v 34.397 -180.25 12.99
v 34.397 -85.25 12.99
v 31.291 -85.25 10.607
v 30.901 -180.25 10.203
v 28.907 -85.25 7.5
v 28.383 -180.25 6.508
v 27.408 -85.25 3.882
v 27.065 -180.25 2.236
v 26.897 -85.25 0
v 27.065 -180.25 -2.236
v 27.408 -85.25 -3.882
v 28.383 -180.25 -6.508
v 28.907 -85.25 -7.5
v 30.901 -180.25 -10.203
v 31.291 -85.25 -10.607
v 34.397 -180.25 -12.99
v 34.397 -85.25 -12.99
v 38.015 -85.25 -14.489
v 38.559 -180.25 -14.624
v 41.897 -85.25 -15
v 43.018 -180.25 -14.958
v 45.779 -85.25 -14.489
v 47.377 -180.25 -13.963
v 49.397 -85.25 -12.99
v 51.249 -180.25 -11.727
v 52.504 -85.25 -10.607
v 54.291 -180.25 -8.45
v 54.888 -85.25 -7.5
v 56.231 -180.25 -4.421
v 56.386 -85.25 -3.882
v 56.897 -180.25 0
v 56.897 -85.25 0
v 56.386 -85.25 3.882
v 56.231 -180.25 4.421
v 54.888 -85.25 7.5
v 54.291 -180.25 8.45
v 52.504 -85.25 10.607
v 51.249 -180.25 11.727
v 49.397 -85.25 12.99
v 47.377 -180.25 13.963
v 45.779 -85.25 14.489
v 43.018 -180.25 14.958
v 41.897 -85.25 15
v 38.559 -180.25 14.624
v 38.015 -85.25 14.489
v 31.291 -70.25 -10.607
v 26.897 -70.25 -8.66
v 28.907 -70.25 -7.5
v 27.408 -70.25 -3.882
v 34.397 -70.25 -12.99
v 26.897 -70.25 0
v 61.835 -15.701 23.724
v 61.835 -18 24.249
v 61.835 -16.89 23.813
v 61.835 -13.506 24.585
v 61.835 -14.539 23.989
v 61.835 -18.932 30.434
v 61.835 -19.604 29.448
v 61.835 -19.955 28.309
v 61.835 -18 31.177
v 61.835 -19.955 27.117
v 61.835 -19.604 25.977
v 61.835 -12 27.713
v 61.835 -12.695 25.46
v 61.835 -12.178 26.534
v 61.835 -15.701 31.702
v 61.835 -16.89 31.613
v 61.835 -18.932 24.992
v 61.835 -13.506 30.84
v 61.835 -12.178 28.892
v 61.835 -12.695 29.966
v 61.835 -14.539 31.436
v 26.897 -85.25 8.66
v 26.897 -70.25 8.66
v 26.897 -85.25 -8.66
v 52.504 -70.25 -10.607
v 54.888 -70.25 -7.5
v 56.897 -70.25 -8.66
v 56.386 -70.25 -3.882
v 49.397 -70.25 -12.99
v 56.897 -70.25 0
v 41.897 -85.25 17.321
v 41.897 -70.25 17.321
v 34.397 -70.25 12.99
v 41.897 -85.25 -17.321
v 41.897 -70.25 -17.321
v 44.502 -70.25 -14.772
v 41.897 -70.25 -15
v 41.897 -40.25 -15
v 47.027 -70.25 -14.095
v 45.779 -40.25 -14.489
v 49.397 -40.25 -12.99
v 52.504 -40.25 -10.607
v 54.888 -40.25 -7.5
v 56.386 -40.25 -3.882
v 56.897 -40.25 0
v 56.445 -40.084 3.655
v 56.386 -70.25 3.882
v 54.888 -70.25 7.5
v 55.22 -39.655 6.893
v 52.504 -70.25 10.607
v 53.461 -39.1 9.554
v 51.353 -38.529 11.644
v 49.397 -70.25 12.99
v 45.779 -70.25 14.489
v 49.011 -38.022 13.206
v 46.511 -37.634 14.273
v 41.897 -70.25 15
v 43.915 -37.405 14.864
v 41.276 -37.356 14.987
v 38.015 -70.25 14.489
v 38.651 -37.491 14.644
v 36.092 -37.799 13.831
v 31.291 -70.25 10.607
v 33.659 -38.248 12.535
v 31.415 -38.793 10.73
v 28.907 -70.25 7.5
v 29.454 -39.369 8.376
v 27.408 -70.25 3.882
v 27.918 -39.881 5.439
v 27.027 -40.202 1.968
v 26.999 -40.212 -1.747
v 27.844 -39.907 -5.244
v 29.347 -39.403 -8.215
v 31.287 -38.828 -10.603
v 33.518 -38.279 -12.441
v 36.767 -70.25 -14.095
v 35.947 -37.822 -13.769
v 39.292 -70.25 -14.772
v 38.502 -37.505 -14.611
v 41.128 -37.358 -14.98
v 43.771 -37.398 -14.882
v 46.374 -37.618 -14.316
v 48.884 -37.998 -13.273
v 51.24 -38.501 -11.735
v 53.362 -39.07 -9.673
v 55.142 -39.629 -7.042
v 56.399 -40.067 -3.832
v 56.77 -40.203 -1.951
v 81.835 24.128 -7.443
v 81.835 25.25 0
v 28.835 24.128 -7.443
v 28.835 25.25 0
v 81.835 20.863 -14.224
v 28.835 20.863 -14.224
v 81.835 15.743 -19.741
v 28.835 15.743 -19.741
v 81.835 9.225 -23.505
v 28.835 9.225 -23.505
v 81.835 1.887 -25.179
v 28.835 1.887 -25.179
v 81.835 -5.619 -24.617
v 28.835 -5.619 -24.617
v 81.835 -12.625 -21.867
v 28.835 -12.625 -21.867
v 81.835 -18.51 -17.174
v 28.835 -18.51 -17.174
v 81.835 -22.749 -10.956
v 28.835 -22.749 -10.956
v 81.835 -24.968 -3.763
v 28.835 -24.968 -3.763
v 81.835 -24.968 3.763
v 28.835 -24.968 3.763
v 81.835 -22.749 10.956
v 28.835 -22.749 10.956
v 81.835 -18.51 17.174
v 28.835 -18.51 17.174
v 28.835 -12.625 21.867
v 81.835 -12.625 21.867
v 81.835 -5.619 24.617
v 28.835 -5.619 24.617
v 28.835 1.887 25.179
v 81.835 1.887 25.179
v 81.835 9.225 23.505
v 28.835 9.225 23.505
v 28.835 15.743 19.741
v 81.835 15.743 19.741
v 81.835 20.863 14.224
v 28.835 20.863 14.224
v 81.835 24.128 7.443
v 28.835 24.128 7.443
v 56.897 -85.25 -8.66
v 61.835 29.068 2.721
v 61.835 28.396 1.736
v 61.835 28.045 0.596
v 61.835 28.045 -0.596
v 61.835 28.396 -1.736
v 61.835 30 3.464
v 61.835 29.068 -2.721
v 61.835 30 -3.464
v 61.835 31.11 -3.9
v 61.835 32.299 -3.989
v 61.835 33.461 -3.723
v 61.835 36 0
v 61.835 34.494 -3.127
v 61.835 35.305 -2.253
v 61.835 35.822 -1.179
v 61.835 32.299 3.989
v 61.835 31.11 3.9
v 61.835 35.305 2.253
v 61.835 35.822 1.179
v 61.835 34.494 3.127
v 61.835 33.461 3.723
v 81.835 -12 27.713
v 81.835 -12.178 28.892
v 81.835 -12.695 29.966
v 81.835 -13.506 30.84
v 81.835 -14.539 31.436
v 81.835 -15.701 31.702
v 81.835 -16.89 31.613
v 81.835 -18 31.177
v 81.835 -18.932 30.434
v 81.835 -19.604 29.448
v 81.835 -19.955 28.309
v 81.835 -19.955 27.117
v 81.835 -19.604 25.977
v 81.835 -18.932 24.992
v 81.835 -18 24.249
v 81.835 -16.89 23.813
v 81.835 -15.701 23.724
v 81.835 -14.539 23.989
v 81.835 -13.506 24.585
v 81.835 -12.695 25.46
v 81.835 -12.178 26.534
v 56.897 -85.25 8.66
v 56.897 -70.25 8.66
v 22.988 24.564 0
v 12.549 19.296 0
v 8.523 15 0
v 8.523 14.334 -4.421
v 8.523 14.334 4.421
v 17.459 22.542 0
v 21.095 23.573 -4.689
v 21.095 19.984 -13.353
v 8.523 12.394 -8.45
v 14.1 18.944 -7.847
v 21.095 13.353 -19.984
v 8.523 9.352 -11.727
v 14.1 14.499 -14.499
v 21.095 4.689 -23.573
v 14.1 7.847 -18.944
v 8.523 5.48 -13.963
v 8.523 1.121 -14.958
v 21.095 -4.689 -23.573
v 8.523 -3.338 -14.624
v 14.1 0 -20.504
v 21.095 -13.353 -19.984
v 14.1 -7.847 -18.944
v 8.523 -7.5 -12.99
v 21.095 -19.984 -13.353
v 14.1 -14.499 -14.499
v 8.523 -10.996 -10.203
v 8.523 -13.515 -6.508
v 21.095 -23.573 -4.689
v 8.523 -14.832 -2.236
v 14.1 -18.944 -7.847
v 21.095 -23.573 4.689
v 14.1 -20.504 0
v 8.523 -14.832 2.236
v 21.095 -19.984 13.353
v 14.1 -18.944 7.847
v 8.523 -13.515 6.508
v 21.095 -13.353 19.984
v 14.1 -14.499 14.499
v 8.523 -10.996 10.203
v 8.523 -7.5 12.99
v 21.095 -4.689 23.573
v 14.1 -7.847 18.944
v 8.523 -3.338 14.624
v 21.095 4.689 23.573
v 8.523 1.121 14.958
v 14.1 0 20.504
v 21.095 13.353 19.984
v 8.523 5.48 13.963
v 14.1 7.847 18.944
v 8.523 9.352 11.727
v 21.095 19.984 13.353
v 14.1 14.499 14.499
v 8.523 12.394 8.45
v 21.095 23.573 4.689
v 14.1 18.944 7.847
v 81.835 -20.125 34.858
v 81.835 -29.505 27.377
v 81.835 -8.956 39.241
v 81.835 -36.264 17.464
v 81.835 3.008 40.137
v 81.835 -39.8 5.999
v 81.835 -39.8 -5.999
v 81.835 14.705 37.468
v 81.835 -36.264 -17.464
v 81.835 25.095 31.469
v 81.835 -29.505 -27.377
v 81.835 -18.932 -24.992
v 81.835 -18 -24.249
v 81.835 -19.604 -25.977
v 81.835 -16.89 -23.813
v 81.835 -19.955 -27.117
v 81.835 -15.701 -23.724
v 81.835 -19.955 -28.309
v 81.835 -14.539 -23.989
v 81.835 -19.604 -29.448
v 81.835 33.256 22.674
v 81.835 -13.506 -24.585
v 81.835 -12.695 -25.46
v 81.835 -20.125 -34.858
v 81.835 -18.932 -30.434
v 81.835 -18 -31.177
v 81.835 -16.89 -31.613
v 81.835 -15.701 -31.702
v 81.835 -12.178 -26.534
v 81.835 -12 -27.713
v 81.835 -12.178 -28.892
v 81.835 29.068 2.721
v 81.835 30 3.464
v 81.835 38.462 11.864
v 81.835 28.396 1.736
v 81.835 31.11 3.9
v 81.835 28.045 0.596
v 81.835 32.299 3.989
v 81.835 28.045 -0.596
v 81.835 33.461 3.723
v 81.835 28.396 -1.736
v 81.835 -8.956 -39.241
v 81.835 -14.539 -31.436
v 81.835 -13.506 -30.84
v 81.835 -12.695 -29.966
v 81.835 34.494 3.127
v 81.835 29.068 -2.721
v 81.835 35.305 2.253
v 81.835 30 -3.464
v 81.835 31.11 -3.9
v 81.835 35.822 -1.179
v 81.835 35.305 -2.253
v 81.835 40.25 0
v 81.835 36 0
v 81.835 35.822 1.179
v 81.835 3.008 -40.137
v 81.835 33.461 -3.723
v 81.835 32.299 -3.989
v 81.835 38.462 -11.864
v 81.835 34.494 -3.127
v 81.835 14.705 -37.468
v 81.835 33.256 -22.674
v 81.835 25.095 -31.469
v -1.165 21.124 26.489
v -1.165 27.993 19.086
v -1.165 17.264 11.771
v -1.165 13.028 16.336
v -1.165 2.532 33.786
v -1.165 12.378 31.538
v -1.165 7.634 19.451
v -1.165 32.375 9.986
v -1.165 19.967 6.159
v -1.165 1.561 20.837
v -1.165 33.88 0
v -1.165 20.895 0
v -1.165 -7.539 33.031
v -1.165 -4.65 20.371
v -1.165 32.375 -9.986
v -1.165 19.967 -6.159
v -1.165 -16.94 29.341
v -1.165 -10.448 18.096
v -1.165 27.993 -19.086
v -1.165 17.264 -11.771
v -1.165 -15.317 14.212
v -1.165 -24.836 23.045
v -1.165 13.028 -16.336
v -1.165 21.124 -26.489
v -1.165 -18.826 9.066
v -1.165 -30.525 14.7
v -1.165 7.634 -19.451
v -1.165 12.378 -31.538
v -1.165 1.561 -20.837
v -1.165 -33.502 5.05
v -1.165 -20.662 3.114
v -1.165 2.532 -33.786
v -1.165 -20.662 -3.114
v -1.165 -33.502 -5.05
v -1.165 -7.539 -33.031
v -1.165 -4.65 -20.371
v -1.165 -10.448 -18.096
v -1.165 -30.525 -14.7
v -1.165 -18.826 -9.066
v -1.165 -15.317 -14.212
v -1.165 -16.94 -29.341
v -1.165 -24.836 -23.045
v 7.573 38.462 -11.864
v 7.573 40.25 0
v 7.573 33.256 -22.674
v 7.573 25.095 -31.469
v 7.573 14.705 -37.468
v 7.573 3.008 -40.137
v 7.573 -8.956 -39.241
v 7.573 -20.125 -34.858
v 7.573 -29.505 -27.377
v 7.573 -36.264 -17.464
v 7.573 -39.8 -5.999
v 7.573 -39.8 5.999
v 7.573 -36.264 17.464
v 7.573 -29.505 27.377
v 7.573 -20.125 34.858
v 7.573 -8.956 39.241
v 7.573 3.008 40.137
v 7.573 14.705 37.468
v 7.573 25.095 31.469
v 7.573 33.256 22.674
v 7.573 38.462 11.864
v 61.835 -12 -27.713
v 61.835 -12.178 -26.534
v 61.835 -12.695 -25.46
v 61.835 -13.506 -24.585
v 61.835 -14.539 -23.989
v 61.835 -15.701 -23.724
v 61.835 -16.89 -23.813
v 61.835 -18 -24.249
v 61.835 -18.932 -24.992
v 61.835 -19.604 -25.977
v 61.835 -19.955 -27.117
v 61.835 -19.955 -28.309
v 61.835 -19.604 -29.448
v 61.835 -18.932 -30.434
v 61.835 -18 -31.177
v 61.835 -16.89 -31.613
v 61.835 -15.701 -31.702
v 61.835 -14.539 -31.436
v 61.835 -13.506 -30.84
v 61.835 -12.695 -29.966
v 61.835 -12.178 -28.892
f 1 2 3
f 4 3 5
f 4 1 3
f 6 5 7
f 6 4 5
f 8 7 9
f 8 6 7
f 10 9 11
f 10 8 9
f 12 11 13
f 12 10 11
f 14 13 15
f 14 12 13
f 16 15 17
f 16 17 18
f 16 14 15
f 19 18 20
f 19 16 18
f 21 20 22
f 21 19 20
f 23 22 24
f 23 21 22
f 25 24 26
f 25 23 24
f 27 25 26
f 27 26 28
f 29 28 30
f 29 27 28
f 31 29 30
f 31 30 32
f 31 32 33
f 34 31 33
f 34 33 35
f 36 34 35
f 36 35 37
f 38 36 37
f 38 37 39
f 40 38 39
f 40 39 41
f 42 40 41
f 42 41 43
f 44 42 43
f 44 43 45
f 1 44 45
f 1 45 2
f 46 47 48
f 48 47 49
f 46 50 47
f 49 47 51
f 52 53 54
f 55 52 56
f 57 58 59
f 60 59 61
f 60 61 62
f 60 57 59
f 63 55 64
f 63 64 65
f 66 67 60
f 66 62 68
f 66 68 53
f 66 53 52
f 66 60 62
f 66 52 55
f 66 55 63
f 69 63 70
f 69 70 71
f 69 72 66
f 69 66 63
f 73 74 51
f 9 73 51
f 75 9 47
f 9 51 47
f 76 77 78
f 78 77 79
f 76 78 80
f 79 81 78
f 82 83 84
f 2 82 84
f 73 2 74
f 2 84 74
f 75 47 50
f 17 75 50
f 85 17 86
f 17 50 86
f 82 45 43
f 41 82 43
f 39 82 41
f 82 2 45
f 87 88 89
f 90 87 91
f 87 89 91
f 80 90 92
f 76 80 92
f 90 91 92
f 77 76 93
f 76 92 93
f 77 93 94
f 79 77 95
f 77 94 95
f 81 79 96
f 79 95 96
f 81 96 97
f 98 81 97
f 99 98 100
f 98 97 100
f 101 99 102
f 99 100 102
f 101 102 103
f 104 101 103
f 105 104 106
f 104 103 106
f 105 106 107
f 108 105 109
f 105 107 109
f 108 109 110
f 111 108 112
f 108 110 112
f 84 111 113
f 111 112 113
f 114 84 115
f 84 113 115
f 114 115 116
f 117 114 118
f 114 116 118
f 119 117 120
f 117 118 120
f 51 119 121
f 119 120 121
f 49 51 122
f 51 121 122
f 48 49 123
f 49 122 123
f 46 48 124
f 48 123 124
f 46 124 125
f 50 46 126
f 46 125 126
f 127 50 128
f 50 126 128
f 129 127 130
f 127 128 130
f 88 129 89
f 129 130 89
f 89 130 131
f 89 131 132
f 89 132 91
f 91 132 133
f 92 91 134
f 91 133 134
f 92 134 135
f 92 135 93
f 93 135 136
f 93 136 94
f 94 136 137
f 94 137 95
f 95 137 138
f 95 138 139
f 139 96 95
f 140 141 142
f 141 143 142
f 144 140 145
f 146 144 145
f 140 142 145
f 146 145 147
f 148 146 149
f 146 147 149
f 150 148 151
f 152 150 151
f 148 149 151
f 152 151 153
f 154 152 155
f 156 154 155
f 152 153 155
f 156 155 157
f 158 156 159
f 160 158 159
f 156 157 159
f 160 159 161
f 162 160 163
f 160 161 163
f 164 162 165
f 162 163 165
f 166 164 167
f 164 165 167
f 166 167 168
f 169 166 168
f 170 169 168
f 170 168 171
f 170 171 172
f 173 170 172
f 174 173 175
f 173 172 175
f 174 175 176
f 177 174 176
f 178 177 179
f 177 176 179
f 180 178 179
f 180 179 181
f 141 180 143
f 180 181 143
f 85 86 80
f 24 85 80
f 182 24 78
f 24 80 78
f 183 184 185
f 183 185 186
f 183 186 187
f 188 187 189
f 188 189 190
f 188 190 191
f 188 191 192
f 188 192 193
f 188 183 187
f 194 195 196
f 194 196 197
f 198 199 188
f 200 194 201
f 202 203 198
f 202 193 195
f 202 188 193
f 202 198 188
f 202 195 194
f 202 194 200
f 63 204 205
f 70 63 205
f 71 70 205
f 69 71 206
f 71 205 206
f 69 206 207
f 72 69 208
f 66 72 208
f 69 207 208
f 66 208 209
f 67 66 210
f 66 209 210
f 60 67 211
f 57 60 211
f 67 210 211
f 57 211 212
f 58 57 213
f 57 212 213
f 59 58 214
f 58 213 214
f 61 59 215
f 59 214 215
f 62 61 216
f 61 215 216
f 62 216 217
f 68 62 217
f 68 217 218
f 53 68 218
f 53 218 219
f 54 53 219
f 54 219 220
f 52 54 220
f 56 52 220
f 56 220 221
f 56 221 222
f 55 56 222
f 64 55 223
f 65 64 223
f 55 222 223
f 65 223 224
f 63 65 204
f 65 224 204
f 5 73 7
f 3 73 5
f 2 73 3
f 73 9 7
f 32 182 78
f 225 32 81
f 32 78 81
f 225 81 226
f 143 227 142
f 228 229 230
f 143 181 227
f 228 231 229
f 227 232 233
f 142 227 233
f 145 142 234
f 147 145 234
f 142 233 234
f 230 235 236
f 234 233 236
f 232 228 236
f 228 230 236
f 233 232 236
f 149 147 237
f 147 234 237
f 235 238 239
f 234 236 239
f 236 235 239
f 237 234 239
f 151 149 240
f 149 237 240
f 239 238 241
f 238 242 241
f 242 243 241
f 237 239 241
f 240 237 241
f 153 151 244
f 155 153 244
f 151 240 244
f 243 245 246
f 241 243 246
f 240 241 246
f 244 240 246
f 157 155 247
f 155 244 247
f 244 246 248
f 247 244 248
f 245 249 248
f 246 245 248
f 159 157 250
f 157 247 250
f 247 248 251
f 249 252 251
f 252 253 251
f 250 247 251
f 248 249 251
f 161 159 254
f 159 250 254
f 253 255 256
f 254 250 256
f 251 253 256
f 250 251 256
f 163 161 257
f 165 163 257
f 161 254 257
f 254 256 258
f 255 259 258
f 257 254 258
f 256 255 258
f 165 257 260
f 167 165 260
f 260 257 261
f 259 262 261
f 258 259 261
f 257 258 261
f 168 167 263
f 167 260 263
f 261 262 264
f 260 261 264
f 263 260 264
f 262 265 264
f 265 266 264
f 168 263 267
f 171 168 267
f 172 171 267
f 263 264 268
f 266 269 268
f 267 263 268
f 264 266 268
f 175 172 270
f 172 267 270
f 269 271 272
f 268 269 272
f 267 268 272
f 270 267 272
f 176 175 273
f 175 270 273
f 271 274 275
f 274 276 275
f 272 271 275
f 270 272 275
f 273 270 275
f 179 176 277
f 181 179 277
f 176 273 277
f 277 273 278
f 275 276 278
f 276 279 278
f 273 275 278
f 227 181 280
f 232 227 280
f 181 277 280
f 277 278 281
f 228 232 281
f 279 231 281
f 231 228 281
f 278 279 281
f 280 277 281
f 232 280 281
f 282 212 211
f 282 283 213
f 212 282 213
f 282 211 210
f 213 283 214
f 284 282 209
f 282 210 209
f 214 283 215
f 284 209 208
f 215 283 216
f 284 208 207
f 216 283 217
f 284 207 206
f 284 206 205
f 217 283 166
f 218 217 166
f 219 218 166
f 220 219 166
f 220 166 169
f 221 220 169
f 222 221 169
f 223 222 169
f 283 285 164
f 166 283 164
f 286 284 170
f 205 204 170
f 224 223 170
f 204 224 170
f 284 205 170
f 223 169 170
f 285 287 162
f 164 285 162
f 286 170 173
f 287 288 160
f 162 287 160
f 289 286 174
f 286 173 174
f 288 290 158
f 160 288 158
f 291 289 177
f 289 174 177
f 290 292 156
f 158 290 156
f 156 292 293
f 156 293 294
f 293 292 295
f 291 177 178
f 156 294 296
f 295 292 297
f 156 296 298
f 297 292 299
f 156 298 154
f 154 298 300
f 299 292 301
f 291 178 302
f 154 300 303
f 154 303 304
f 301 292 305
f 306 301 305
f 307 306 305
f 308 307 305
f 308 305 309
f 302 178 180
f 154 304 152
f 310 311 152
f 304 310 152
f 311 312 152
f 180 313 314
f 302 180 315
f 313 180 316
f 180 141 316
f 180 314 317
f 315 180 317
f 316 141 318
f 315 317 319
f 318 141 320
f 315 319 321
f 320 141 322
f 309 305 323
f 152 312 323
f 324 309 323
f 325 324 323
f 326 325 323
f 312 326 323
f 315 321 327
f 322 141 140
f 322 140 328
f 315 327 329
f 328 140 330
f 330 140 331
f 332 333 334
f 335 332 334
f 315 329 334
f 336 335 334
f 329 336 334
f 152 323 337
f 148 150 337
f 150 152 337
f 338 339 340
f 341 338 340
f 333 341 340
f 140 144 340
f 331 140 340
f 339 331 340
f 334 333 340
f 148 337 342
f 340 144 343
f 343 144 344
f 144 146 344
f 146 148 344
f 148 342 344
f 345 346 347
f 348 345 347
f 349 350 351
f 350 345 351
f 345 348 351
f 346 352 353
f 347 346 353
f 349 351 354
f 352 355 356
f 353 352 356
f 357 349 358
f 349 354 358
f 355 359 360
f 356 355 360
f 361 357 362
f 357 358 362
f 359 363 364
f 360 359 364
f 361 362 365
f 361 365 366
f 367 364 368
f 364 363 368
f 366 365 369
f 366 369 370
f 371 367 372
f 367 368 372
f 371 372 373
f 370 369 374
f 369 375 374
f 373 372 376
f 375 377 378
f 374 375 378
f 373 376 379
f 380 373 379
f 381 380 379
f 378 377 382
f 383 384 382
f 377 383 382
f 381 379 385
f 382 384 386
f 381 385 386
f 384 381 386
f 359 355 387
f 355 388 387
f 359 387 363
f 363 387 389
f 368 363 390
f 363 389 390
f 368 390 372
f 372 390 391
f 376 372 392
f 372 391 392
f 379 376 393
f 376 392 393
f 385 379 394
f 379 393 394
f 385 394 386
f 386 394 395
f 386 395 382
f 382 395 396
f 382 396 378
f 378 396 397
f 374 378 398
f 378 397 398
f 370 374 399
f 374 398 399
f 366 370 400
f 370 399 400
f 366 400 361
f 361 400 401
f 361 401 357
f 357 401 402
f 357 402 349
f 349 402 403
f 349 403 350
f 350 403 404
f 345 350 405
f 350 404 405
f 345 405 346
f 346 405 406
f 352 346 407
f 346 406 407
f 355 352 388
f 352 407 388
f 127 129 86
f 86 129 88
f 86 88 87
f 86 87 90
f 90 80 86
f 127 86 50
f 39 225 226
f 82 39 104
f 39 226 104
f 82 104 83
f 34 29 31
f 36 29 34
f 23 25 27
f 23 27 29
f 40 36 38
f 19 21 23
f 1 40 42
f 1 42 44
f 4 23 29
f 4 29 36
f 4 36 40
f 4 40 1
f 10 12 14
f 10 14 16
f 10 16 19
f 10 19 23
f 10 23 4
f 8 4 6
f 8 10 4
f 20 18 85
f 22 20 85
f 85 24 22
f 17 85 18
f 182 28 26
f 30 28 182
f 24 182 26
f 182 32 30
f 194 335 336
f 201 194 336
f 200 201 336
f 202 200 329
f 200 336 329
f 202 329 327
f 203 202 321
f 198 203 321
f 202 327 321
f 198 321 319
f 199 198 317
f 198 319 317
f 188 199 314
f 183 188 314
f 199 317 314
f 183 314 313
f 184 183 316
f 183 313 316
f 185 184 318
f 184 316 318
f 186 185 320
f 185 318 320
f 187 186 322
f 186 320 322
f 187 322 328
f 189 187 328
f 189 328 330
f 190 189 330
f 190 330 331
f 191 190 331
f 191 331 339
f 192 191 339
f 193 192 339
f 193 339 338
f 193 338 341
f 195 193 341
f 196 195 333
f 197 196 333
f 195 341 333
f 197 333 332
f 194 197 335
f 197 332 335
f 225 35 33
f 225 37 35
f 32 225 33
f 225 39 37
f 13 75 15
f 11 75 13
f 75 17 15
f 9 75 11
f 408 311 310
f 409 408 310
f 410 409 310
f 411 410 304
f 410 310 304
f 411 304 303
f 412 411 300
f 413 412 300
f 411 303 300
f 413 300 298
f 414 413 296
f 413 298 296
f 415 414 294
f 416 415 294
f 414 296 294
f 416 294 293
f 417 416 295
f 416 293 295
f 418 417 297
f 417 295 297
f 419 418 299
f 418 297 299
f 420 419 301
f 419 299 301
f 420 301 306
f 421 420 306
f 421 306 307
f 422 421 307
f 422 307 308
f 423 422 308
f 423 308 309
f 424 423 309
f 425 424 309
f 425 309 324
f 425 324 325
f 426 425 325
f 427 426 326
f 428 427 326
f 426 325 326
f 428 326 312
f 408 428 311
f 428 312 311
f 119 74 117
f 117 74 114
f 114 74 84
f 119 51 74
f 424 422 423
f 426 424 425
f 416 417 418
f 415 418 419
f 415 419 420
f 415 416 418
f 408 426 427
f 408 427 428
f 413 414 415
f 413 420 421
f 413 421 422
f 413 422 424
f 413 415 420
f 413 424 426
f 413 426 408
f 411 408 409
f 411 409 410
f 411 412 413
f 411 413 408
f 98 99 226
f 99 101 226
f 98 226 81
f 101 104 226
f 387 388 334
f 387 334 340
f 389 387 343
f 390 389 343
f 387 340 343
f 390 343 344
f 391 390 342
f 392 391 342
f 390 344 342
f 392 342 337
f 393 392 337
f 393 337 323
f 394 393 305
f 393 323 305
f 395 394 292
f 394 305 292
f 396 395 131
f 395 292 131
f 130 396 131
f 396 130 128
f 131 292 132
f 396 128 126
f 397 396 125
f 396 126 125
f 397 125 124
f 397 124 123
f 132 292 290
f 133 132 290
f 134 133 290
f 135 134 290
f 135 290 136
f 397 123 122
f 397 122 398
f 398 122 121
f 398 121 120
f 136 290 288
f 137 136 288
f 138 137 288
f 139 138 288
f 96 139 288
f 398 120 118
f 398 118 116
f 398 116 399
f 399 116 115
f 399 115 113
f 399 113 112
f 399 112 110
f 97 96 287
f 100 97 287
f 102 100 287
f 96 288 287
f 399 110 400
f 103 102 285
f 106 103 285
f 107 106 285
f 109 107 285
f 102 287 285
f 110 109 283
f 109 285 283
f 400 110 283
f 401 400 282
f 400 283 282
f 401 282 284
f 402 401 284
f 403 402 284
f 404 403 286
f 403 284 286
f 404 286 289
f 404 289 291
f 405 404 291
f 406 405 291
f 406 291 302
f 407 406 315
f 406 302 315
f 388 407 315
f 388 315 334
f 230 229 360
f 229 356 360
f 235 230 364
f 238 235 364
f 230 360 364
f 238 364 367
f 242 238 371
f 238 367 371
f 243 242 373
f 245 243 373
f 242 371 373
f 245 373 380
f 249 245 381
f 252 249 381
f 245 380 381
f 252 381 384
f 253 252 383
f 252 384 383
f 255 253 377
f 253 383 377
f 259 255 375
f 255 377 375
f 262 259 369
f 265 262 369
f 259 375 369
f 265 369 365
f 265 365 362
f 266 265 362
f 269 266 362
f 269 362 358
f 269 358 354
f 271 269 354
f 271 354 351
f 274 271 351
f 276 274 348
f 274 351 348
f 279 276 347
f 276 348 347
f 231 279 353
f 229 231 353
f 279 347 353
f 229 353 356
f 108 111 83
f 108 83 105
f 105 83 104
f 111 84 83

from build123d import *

# Parameters (mm, degrees)
SKETCH2_R                            = 15
BOSS_EXTRUDE1_DEPTH                  = 30
BOSS_EXTRUDE1_DIRECTION_2_REACH      = 123.644
BOSS_EXTRUDE1_DIRECTION_2_END_RADIUS = 40.25
BOSS_EXTRUDE2_DEPTH                  = 15
BOSS_EXTRUDE3_START                  = 95
SKETCH4_R                            = 15
BOSS_EXTRUDE3_DEPTH                  = 95
SKETCH5_R                            = 4
CUT_EXTRUDE1_DEPTH                   = 20


with BuildPart() as part:
    # Sketch1 → Revolve1 (revolve)
    with BuildSketch(Plane.XY):
        with BuildLine():
            Line((8.523453836, 15), (-1.164911567, 20.895027572))
            Line((-1.164911567, 20.895027572), (-1.164911567, 33.880431222))
            Line((-1.164911567, 33.880431222), (7.573302349, 40.25))
            Line((7.573302349, 40.25), (81.835088433, 40.25))
            Line((81.835088433, 40.25), (81.835088433, 25.25))
            Line((81.835088433, 25.25), (28.835088433, 25.25))
            ThreePointArc((28.835088433, 25.25), (17.45940164, 22.542321309), (8.523453836, 15))
        make_face()
    revolve(axis=Axis((28.835088433, 0, 0), (-1, 0, 0)))

    # Sketch2 → Boss-Extrude1 (add)
    with BuildSketch(Plane(origin=(0, -40.25, 0), x_dir=(-1, 0, 0), z_dir=(0, -1, 0))):
        with Locations(Location((-41.897124258, 0, 0), (0, 0, 90))):
            Circle(SKETCH2_R)
    extrude(amount=BOSS_EXTRUDE1_DEPTH)

    # Boss-Extrude1 direction 2: up to this cylinder (the profile starts outside it)
    boss_extrude1_direction_2_end = Plane(origin=(41.897124, 0, 0), z_dir=(1, 0, 0)) * Cylinder(BOSS_EXTRUDE1_DIRECTION_2_END_RADIUS, 328.788, mode=Mode.PRIVATE)
    # Sketch2 → Boss-Extrude1 direction 2 (add, up to the surface)
    with BuildSketch(Plane(origin=(0, -40.25, 0), x_dir=(-1, 0, 0), z_dir=(0, -1, 0)), mode=Mode.PRIVATE) as boss_extrude1_direction_2_sk1:
        with Locations(Location((-41.897124258, 0, 0), (0, 0, 90))):
            Circle(SKETCH2_R)
    boss_extrude1_direction_2_tool1 = extrude(boss_extrude1_direction_2_sk1.sketch, amount=-BOSS_EXTRUDE1_DIRECTION_2_REACH, mode=Mode.PRIVATE) - boss_extrude1_direction_2_end
    add(boss_extrude1_direction_2_tool1.solids().sort_by_distance((41.897124, -40.25, 0))[0])
    add(boss_extrude1_direction_2_tool1.solids().sort_by_distance((41.897124, -40.25, 0))[1])

    # Sketch3 → Boss-Extrude2 (add)
    with BuildSketch(Plane.XZ.offset(70.25)):
        Polygon((56.897124258, -8.660254038), (56.897124258, 8.660254038), (41.897124258, 17.320508076), (26.897124258, 8.660254038), (26.897124258, -8.660254038), (41.897124258, -17.320508076), align=None)
    extrude(amount=BOSS_EXTRUDE2_DEPTH)

    # Sketch4 → Boss-Extrude3 (add)
    with BuildSketch(Plane.XZ.offset(85.25).offset(BOSS_EXTRUDE3_START)):
        with Locations(Location((41.897124258, 0, 0), (0, 0, 120))):
            Circle(SKETCH4_R)
    extrude(amount=-BOSS_EXTRUDE3_DEPTH)

    # Sketch5 → Cut-Extrude1 (cut)
    with BuildSketch(Plane(origin=(81.835088433, 0, 0), x_dir=(0, 0, -1), z_dir=(1, 0, 0))):
        with Locations(Location((0, 32, 0), (0, 0, 90))):
            Circle(SKETCH5_R)
        with Locations(Location((27.712812921, -16, 0), (0, 0, 90))):
            Circle(SKETCH5_R)
        with Locations(Location((-27.712812921, -16, 0), (0, 0, 90))):
            Circle(SKETCH5_R)
    extrude(amount=-CUT_EXTRUDE1_DEPTH, mode=Mode.SUBTRACT)


solid = part.part
